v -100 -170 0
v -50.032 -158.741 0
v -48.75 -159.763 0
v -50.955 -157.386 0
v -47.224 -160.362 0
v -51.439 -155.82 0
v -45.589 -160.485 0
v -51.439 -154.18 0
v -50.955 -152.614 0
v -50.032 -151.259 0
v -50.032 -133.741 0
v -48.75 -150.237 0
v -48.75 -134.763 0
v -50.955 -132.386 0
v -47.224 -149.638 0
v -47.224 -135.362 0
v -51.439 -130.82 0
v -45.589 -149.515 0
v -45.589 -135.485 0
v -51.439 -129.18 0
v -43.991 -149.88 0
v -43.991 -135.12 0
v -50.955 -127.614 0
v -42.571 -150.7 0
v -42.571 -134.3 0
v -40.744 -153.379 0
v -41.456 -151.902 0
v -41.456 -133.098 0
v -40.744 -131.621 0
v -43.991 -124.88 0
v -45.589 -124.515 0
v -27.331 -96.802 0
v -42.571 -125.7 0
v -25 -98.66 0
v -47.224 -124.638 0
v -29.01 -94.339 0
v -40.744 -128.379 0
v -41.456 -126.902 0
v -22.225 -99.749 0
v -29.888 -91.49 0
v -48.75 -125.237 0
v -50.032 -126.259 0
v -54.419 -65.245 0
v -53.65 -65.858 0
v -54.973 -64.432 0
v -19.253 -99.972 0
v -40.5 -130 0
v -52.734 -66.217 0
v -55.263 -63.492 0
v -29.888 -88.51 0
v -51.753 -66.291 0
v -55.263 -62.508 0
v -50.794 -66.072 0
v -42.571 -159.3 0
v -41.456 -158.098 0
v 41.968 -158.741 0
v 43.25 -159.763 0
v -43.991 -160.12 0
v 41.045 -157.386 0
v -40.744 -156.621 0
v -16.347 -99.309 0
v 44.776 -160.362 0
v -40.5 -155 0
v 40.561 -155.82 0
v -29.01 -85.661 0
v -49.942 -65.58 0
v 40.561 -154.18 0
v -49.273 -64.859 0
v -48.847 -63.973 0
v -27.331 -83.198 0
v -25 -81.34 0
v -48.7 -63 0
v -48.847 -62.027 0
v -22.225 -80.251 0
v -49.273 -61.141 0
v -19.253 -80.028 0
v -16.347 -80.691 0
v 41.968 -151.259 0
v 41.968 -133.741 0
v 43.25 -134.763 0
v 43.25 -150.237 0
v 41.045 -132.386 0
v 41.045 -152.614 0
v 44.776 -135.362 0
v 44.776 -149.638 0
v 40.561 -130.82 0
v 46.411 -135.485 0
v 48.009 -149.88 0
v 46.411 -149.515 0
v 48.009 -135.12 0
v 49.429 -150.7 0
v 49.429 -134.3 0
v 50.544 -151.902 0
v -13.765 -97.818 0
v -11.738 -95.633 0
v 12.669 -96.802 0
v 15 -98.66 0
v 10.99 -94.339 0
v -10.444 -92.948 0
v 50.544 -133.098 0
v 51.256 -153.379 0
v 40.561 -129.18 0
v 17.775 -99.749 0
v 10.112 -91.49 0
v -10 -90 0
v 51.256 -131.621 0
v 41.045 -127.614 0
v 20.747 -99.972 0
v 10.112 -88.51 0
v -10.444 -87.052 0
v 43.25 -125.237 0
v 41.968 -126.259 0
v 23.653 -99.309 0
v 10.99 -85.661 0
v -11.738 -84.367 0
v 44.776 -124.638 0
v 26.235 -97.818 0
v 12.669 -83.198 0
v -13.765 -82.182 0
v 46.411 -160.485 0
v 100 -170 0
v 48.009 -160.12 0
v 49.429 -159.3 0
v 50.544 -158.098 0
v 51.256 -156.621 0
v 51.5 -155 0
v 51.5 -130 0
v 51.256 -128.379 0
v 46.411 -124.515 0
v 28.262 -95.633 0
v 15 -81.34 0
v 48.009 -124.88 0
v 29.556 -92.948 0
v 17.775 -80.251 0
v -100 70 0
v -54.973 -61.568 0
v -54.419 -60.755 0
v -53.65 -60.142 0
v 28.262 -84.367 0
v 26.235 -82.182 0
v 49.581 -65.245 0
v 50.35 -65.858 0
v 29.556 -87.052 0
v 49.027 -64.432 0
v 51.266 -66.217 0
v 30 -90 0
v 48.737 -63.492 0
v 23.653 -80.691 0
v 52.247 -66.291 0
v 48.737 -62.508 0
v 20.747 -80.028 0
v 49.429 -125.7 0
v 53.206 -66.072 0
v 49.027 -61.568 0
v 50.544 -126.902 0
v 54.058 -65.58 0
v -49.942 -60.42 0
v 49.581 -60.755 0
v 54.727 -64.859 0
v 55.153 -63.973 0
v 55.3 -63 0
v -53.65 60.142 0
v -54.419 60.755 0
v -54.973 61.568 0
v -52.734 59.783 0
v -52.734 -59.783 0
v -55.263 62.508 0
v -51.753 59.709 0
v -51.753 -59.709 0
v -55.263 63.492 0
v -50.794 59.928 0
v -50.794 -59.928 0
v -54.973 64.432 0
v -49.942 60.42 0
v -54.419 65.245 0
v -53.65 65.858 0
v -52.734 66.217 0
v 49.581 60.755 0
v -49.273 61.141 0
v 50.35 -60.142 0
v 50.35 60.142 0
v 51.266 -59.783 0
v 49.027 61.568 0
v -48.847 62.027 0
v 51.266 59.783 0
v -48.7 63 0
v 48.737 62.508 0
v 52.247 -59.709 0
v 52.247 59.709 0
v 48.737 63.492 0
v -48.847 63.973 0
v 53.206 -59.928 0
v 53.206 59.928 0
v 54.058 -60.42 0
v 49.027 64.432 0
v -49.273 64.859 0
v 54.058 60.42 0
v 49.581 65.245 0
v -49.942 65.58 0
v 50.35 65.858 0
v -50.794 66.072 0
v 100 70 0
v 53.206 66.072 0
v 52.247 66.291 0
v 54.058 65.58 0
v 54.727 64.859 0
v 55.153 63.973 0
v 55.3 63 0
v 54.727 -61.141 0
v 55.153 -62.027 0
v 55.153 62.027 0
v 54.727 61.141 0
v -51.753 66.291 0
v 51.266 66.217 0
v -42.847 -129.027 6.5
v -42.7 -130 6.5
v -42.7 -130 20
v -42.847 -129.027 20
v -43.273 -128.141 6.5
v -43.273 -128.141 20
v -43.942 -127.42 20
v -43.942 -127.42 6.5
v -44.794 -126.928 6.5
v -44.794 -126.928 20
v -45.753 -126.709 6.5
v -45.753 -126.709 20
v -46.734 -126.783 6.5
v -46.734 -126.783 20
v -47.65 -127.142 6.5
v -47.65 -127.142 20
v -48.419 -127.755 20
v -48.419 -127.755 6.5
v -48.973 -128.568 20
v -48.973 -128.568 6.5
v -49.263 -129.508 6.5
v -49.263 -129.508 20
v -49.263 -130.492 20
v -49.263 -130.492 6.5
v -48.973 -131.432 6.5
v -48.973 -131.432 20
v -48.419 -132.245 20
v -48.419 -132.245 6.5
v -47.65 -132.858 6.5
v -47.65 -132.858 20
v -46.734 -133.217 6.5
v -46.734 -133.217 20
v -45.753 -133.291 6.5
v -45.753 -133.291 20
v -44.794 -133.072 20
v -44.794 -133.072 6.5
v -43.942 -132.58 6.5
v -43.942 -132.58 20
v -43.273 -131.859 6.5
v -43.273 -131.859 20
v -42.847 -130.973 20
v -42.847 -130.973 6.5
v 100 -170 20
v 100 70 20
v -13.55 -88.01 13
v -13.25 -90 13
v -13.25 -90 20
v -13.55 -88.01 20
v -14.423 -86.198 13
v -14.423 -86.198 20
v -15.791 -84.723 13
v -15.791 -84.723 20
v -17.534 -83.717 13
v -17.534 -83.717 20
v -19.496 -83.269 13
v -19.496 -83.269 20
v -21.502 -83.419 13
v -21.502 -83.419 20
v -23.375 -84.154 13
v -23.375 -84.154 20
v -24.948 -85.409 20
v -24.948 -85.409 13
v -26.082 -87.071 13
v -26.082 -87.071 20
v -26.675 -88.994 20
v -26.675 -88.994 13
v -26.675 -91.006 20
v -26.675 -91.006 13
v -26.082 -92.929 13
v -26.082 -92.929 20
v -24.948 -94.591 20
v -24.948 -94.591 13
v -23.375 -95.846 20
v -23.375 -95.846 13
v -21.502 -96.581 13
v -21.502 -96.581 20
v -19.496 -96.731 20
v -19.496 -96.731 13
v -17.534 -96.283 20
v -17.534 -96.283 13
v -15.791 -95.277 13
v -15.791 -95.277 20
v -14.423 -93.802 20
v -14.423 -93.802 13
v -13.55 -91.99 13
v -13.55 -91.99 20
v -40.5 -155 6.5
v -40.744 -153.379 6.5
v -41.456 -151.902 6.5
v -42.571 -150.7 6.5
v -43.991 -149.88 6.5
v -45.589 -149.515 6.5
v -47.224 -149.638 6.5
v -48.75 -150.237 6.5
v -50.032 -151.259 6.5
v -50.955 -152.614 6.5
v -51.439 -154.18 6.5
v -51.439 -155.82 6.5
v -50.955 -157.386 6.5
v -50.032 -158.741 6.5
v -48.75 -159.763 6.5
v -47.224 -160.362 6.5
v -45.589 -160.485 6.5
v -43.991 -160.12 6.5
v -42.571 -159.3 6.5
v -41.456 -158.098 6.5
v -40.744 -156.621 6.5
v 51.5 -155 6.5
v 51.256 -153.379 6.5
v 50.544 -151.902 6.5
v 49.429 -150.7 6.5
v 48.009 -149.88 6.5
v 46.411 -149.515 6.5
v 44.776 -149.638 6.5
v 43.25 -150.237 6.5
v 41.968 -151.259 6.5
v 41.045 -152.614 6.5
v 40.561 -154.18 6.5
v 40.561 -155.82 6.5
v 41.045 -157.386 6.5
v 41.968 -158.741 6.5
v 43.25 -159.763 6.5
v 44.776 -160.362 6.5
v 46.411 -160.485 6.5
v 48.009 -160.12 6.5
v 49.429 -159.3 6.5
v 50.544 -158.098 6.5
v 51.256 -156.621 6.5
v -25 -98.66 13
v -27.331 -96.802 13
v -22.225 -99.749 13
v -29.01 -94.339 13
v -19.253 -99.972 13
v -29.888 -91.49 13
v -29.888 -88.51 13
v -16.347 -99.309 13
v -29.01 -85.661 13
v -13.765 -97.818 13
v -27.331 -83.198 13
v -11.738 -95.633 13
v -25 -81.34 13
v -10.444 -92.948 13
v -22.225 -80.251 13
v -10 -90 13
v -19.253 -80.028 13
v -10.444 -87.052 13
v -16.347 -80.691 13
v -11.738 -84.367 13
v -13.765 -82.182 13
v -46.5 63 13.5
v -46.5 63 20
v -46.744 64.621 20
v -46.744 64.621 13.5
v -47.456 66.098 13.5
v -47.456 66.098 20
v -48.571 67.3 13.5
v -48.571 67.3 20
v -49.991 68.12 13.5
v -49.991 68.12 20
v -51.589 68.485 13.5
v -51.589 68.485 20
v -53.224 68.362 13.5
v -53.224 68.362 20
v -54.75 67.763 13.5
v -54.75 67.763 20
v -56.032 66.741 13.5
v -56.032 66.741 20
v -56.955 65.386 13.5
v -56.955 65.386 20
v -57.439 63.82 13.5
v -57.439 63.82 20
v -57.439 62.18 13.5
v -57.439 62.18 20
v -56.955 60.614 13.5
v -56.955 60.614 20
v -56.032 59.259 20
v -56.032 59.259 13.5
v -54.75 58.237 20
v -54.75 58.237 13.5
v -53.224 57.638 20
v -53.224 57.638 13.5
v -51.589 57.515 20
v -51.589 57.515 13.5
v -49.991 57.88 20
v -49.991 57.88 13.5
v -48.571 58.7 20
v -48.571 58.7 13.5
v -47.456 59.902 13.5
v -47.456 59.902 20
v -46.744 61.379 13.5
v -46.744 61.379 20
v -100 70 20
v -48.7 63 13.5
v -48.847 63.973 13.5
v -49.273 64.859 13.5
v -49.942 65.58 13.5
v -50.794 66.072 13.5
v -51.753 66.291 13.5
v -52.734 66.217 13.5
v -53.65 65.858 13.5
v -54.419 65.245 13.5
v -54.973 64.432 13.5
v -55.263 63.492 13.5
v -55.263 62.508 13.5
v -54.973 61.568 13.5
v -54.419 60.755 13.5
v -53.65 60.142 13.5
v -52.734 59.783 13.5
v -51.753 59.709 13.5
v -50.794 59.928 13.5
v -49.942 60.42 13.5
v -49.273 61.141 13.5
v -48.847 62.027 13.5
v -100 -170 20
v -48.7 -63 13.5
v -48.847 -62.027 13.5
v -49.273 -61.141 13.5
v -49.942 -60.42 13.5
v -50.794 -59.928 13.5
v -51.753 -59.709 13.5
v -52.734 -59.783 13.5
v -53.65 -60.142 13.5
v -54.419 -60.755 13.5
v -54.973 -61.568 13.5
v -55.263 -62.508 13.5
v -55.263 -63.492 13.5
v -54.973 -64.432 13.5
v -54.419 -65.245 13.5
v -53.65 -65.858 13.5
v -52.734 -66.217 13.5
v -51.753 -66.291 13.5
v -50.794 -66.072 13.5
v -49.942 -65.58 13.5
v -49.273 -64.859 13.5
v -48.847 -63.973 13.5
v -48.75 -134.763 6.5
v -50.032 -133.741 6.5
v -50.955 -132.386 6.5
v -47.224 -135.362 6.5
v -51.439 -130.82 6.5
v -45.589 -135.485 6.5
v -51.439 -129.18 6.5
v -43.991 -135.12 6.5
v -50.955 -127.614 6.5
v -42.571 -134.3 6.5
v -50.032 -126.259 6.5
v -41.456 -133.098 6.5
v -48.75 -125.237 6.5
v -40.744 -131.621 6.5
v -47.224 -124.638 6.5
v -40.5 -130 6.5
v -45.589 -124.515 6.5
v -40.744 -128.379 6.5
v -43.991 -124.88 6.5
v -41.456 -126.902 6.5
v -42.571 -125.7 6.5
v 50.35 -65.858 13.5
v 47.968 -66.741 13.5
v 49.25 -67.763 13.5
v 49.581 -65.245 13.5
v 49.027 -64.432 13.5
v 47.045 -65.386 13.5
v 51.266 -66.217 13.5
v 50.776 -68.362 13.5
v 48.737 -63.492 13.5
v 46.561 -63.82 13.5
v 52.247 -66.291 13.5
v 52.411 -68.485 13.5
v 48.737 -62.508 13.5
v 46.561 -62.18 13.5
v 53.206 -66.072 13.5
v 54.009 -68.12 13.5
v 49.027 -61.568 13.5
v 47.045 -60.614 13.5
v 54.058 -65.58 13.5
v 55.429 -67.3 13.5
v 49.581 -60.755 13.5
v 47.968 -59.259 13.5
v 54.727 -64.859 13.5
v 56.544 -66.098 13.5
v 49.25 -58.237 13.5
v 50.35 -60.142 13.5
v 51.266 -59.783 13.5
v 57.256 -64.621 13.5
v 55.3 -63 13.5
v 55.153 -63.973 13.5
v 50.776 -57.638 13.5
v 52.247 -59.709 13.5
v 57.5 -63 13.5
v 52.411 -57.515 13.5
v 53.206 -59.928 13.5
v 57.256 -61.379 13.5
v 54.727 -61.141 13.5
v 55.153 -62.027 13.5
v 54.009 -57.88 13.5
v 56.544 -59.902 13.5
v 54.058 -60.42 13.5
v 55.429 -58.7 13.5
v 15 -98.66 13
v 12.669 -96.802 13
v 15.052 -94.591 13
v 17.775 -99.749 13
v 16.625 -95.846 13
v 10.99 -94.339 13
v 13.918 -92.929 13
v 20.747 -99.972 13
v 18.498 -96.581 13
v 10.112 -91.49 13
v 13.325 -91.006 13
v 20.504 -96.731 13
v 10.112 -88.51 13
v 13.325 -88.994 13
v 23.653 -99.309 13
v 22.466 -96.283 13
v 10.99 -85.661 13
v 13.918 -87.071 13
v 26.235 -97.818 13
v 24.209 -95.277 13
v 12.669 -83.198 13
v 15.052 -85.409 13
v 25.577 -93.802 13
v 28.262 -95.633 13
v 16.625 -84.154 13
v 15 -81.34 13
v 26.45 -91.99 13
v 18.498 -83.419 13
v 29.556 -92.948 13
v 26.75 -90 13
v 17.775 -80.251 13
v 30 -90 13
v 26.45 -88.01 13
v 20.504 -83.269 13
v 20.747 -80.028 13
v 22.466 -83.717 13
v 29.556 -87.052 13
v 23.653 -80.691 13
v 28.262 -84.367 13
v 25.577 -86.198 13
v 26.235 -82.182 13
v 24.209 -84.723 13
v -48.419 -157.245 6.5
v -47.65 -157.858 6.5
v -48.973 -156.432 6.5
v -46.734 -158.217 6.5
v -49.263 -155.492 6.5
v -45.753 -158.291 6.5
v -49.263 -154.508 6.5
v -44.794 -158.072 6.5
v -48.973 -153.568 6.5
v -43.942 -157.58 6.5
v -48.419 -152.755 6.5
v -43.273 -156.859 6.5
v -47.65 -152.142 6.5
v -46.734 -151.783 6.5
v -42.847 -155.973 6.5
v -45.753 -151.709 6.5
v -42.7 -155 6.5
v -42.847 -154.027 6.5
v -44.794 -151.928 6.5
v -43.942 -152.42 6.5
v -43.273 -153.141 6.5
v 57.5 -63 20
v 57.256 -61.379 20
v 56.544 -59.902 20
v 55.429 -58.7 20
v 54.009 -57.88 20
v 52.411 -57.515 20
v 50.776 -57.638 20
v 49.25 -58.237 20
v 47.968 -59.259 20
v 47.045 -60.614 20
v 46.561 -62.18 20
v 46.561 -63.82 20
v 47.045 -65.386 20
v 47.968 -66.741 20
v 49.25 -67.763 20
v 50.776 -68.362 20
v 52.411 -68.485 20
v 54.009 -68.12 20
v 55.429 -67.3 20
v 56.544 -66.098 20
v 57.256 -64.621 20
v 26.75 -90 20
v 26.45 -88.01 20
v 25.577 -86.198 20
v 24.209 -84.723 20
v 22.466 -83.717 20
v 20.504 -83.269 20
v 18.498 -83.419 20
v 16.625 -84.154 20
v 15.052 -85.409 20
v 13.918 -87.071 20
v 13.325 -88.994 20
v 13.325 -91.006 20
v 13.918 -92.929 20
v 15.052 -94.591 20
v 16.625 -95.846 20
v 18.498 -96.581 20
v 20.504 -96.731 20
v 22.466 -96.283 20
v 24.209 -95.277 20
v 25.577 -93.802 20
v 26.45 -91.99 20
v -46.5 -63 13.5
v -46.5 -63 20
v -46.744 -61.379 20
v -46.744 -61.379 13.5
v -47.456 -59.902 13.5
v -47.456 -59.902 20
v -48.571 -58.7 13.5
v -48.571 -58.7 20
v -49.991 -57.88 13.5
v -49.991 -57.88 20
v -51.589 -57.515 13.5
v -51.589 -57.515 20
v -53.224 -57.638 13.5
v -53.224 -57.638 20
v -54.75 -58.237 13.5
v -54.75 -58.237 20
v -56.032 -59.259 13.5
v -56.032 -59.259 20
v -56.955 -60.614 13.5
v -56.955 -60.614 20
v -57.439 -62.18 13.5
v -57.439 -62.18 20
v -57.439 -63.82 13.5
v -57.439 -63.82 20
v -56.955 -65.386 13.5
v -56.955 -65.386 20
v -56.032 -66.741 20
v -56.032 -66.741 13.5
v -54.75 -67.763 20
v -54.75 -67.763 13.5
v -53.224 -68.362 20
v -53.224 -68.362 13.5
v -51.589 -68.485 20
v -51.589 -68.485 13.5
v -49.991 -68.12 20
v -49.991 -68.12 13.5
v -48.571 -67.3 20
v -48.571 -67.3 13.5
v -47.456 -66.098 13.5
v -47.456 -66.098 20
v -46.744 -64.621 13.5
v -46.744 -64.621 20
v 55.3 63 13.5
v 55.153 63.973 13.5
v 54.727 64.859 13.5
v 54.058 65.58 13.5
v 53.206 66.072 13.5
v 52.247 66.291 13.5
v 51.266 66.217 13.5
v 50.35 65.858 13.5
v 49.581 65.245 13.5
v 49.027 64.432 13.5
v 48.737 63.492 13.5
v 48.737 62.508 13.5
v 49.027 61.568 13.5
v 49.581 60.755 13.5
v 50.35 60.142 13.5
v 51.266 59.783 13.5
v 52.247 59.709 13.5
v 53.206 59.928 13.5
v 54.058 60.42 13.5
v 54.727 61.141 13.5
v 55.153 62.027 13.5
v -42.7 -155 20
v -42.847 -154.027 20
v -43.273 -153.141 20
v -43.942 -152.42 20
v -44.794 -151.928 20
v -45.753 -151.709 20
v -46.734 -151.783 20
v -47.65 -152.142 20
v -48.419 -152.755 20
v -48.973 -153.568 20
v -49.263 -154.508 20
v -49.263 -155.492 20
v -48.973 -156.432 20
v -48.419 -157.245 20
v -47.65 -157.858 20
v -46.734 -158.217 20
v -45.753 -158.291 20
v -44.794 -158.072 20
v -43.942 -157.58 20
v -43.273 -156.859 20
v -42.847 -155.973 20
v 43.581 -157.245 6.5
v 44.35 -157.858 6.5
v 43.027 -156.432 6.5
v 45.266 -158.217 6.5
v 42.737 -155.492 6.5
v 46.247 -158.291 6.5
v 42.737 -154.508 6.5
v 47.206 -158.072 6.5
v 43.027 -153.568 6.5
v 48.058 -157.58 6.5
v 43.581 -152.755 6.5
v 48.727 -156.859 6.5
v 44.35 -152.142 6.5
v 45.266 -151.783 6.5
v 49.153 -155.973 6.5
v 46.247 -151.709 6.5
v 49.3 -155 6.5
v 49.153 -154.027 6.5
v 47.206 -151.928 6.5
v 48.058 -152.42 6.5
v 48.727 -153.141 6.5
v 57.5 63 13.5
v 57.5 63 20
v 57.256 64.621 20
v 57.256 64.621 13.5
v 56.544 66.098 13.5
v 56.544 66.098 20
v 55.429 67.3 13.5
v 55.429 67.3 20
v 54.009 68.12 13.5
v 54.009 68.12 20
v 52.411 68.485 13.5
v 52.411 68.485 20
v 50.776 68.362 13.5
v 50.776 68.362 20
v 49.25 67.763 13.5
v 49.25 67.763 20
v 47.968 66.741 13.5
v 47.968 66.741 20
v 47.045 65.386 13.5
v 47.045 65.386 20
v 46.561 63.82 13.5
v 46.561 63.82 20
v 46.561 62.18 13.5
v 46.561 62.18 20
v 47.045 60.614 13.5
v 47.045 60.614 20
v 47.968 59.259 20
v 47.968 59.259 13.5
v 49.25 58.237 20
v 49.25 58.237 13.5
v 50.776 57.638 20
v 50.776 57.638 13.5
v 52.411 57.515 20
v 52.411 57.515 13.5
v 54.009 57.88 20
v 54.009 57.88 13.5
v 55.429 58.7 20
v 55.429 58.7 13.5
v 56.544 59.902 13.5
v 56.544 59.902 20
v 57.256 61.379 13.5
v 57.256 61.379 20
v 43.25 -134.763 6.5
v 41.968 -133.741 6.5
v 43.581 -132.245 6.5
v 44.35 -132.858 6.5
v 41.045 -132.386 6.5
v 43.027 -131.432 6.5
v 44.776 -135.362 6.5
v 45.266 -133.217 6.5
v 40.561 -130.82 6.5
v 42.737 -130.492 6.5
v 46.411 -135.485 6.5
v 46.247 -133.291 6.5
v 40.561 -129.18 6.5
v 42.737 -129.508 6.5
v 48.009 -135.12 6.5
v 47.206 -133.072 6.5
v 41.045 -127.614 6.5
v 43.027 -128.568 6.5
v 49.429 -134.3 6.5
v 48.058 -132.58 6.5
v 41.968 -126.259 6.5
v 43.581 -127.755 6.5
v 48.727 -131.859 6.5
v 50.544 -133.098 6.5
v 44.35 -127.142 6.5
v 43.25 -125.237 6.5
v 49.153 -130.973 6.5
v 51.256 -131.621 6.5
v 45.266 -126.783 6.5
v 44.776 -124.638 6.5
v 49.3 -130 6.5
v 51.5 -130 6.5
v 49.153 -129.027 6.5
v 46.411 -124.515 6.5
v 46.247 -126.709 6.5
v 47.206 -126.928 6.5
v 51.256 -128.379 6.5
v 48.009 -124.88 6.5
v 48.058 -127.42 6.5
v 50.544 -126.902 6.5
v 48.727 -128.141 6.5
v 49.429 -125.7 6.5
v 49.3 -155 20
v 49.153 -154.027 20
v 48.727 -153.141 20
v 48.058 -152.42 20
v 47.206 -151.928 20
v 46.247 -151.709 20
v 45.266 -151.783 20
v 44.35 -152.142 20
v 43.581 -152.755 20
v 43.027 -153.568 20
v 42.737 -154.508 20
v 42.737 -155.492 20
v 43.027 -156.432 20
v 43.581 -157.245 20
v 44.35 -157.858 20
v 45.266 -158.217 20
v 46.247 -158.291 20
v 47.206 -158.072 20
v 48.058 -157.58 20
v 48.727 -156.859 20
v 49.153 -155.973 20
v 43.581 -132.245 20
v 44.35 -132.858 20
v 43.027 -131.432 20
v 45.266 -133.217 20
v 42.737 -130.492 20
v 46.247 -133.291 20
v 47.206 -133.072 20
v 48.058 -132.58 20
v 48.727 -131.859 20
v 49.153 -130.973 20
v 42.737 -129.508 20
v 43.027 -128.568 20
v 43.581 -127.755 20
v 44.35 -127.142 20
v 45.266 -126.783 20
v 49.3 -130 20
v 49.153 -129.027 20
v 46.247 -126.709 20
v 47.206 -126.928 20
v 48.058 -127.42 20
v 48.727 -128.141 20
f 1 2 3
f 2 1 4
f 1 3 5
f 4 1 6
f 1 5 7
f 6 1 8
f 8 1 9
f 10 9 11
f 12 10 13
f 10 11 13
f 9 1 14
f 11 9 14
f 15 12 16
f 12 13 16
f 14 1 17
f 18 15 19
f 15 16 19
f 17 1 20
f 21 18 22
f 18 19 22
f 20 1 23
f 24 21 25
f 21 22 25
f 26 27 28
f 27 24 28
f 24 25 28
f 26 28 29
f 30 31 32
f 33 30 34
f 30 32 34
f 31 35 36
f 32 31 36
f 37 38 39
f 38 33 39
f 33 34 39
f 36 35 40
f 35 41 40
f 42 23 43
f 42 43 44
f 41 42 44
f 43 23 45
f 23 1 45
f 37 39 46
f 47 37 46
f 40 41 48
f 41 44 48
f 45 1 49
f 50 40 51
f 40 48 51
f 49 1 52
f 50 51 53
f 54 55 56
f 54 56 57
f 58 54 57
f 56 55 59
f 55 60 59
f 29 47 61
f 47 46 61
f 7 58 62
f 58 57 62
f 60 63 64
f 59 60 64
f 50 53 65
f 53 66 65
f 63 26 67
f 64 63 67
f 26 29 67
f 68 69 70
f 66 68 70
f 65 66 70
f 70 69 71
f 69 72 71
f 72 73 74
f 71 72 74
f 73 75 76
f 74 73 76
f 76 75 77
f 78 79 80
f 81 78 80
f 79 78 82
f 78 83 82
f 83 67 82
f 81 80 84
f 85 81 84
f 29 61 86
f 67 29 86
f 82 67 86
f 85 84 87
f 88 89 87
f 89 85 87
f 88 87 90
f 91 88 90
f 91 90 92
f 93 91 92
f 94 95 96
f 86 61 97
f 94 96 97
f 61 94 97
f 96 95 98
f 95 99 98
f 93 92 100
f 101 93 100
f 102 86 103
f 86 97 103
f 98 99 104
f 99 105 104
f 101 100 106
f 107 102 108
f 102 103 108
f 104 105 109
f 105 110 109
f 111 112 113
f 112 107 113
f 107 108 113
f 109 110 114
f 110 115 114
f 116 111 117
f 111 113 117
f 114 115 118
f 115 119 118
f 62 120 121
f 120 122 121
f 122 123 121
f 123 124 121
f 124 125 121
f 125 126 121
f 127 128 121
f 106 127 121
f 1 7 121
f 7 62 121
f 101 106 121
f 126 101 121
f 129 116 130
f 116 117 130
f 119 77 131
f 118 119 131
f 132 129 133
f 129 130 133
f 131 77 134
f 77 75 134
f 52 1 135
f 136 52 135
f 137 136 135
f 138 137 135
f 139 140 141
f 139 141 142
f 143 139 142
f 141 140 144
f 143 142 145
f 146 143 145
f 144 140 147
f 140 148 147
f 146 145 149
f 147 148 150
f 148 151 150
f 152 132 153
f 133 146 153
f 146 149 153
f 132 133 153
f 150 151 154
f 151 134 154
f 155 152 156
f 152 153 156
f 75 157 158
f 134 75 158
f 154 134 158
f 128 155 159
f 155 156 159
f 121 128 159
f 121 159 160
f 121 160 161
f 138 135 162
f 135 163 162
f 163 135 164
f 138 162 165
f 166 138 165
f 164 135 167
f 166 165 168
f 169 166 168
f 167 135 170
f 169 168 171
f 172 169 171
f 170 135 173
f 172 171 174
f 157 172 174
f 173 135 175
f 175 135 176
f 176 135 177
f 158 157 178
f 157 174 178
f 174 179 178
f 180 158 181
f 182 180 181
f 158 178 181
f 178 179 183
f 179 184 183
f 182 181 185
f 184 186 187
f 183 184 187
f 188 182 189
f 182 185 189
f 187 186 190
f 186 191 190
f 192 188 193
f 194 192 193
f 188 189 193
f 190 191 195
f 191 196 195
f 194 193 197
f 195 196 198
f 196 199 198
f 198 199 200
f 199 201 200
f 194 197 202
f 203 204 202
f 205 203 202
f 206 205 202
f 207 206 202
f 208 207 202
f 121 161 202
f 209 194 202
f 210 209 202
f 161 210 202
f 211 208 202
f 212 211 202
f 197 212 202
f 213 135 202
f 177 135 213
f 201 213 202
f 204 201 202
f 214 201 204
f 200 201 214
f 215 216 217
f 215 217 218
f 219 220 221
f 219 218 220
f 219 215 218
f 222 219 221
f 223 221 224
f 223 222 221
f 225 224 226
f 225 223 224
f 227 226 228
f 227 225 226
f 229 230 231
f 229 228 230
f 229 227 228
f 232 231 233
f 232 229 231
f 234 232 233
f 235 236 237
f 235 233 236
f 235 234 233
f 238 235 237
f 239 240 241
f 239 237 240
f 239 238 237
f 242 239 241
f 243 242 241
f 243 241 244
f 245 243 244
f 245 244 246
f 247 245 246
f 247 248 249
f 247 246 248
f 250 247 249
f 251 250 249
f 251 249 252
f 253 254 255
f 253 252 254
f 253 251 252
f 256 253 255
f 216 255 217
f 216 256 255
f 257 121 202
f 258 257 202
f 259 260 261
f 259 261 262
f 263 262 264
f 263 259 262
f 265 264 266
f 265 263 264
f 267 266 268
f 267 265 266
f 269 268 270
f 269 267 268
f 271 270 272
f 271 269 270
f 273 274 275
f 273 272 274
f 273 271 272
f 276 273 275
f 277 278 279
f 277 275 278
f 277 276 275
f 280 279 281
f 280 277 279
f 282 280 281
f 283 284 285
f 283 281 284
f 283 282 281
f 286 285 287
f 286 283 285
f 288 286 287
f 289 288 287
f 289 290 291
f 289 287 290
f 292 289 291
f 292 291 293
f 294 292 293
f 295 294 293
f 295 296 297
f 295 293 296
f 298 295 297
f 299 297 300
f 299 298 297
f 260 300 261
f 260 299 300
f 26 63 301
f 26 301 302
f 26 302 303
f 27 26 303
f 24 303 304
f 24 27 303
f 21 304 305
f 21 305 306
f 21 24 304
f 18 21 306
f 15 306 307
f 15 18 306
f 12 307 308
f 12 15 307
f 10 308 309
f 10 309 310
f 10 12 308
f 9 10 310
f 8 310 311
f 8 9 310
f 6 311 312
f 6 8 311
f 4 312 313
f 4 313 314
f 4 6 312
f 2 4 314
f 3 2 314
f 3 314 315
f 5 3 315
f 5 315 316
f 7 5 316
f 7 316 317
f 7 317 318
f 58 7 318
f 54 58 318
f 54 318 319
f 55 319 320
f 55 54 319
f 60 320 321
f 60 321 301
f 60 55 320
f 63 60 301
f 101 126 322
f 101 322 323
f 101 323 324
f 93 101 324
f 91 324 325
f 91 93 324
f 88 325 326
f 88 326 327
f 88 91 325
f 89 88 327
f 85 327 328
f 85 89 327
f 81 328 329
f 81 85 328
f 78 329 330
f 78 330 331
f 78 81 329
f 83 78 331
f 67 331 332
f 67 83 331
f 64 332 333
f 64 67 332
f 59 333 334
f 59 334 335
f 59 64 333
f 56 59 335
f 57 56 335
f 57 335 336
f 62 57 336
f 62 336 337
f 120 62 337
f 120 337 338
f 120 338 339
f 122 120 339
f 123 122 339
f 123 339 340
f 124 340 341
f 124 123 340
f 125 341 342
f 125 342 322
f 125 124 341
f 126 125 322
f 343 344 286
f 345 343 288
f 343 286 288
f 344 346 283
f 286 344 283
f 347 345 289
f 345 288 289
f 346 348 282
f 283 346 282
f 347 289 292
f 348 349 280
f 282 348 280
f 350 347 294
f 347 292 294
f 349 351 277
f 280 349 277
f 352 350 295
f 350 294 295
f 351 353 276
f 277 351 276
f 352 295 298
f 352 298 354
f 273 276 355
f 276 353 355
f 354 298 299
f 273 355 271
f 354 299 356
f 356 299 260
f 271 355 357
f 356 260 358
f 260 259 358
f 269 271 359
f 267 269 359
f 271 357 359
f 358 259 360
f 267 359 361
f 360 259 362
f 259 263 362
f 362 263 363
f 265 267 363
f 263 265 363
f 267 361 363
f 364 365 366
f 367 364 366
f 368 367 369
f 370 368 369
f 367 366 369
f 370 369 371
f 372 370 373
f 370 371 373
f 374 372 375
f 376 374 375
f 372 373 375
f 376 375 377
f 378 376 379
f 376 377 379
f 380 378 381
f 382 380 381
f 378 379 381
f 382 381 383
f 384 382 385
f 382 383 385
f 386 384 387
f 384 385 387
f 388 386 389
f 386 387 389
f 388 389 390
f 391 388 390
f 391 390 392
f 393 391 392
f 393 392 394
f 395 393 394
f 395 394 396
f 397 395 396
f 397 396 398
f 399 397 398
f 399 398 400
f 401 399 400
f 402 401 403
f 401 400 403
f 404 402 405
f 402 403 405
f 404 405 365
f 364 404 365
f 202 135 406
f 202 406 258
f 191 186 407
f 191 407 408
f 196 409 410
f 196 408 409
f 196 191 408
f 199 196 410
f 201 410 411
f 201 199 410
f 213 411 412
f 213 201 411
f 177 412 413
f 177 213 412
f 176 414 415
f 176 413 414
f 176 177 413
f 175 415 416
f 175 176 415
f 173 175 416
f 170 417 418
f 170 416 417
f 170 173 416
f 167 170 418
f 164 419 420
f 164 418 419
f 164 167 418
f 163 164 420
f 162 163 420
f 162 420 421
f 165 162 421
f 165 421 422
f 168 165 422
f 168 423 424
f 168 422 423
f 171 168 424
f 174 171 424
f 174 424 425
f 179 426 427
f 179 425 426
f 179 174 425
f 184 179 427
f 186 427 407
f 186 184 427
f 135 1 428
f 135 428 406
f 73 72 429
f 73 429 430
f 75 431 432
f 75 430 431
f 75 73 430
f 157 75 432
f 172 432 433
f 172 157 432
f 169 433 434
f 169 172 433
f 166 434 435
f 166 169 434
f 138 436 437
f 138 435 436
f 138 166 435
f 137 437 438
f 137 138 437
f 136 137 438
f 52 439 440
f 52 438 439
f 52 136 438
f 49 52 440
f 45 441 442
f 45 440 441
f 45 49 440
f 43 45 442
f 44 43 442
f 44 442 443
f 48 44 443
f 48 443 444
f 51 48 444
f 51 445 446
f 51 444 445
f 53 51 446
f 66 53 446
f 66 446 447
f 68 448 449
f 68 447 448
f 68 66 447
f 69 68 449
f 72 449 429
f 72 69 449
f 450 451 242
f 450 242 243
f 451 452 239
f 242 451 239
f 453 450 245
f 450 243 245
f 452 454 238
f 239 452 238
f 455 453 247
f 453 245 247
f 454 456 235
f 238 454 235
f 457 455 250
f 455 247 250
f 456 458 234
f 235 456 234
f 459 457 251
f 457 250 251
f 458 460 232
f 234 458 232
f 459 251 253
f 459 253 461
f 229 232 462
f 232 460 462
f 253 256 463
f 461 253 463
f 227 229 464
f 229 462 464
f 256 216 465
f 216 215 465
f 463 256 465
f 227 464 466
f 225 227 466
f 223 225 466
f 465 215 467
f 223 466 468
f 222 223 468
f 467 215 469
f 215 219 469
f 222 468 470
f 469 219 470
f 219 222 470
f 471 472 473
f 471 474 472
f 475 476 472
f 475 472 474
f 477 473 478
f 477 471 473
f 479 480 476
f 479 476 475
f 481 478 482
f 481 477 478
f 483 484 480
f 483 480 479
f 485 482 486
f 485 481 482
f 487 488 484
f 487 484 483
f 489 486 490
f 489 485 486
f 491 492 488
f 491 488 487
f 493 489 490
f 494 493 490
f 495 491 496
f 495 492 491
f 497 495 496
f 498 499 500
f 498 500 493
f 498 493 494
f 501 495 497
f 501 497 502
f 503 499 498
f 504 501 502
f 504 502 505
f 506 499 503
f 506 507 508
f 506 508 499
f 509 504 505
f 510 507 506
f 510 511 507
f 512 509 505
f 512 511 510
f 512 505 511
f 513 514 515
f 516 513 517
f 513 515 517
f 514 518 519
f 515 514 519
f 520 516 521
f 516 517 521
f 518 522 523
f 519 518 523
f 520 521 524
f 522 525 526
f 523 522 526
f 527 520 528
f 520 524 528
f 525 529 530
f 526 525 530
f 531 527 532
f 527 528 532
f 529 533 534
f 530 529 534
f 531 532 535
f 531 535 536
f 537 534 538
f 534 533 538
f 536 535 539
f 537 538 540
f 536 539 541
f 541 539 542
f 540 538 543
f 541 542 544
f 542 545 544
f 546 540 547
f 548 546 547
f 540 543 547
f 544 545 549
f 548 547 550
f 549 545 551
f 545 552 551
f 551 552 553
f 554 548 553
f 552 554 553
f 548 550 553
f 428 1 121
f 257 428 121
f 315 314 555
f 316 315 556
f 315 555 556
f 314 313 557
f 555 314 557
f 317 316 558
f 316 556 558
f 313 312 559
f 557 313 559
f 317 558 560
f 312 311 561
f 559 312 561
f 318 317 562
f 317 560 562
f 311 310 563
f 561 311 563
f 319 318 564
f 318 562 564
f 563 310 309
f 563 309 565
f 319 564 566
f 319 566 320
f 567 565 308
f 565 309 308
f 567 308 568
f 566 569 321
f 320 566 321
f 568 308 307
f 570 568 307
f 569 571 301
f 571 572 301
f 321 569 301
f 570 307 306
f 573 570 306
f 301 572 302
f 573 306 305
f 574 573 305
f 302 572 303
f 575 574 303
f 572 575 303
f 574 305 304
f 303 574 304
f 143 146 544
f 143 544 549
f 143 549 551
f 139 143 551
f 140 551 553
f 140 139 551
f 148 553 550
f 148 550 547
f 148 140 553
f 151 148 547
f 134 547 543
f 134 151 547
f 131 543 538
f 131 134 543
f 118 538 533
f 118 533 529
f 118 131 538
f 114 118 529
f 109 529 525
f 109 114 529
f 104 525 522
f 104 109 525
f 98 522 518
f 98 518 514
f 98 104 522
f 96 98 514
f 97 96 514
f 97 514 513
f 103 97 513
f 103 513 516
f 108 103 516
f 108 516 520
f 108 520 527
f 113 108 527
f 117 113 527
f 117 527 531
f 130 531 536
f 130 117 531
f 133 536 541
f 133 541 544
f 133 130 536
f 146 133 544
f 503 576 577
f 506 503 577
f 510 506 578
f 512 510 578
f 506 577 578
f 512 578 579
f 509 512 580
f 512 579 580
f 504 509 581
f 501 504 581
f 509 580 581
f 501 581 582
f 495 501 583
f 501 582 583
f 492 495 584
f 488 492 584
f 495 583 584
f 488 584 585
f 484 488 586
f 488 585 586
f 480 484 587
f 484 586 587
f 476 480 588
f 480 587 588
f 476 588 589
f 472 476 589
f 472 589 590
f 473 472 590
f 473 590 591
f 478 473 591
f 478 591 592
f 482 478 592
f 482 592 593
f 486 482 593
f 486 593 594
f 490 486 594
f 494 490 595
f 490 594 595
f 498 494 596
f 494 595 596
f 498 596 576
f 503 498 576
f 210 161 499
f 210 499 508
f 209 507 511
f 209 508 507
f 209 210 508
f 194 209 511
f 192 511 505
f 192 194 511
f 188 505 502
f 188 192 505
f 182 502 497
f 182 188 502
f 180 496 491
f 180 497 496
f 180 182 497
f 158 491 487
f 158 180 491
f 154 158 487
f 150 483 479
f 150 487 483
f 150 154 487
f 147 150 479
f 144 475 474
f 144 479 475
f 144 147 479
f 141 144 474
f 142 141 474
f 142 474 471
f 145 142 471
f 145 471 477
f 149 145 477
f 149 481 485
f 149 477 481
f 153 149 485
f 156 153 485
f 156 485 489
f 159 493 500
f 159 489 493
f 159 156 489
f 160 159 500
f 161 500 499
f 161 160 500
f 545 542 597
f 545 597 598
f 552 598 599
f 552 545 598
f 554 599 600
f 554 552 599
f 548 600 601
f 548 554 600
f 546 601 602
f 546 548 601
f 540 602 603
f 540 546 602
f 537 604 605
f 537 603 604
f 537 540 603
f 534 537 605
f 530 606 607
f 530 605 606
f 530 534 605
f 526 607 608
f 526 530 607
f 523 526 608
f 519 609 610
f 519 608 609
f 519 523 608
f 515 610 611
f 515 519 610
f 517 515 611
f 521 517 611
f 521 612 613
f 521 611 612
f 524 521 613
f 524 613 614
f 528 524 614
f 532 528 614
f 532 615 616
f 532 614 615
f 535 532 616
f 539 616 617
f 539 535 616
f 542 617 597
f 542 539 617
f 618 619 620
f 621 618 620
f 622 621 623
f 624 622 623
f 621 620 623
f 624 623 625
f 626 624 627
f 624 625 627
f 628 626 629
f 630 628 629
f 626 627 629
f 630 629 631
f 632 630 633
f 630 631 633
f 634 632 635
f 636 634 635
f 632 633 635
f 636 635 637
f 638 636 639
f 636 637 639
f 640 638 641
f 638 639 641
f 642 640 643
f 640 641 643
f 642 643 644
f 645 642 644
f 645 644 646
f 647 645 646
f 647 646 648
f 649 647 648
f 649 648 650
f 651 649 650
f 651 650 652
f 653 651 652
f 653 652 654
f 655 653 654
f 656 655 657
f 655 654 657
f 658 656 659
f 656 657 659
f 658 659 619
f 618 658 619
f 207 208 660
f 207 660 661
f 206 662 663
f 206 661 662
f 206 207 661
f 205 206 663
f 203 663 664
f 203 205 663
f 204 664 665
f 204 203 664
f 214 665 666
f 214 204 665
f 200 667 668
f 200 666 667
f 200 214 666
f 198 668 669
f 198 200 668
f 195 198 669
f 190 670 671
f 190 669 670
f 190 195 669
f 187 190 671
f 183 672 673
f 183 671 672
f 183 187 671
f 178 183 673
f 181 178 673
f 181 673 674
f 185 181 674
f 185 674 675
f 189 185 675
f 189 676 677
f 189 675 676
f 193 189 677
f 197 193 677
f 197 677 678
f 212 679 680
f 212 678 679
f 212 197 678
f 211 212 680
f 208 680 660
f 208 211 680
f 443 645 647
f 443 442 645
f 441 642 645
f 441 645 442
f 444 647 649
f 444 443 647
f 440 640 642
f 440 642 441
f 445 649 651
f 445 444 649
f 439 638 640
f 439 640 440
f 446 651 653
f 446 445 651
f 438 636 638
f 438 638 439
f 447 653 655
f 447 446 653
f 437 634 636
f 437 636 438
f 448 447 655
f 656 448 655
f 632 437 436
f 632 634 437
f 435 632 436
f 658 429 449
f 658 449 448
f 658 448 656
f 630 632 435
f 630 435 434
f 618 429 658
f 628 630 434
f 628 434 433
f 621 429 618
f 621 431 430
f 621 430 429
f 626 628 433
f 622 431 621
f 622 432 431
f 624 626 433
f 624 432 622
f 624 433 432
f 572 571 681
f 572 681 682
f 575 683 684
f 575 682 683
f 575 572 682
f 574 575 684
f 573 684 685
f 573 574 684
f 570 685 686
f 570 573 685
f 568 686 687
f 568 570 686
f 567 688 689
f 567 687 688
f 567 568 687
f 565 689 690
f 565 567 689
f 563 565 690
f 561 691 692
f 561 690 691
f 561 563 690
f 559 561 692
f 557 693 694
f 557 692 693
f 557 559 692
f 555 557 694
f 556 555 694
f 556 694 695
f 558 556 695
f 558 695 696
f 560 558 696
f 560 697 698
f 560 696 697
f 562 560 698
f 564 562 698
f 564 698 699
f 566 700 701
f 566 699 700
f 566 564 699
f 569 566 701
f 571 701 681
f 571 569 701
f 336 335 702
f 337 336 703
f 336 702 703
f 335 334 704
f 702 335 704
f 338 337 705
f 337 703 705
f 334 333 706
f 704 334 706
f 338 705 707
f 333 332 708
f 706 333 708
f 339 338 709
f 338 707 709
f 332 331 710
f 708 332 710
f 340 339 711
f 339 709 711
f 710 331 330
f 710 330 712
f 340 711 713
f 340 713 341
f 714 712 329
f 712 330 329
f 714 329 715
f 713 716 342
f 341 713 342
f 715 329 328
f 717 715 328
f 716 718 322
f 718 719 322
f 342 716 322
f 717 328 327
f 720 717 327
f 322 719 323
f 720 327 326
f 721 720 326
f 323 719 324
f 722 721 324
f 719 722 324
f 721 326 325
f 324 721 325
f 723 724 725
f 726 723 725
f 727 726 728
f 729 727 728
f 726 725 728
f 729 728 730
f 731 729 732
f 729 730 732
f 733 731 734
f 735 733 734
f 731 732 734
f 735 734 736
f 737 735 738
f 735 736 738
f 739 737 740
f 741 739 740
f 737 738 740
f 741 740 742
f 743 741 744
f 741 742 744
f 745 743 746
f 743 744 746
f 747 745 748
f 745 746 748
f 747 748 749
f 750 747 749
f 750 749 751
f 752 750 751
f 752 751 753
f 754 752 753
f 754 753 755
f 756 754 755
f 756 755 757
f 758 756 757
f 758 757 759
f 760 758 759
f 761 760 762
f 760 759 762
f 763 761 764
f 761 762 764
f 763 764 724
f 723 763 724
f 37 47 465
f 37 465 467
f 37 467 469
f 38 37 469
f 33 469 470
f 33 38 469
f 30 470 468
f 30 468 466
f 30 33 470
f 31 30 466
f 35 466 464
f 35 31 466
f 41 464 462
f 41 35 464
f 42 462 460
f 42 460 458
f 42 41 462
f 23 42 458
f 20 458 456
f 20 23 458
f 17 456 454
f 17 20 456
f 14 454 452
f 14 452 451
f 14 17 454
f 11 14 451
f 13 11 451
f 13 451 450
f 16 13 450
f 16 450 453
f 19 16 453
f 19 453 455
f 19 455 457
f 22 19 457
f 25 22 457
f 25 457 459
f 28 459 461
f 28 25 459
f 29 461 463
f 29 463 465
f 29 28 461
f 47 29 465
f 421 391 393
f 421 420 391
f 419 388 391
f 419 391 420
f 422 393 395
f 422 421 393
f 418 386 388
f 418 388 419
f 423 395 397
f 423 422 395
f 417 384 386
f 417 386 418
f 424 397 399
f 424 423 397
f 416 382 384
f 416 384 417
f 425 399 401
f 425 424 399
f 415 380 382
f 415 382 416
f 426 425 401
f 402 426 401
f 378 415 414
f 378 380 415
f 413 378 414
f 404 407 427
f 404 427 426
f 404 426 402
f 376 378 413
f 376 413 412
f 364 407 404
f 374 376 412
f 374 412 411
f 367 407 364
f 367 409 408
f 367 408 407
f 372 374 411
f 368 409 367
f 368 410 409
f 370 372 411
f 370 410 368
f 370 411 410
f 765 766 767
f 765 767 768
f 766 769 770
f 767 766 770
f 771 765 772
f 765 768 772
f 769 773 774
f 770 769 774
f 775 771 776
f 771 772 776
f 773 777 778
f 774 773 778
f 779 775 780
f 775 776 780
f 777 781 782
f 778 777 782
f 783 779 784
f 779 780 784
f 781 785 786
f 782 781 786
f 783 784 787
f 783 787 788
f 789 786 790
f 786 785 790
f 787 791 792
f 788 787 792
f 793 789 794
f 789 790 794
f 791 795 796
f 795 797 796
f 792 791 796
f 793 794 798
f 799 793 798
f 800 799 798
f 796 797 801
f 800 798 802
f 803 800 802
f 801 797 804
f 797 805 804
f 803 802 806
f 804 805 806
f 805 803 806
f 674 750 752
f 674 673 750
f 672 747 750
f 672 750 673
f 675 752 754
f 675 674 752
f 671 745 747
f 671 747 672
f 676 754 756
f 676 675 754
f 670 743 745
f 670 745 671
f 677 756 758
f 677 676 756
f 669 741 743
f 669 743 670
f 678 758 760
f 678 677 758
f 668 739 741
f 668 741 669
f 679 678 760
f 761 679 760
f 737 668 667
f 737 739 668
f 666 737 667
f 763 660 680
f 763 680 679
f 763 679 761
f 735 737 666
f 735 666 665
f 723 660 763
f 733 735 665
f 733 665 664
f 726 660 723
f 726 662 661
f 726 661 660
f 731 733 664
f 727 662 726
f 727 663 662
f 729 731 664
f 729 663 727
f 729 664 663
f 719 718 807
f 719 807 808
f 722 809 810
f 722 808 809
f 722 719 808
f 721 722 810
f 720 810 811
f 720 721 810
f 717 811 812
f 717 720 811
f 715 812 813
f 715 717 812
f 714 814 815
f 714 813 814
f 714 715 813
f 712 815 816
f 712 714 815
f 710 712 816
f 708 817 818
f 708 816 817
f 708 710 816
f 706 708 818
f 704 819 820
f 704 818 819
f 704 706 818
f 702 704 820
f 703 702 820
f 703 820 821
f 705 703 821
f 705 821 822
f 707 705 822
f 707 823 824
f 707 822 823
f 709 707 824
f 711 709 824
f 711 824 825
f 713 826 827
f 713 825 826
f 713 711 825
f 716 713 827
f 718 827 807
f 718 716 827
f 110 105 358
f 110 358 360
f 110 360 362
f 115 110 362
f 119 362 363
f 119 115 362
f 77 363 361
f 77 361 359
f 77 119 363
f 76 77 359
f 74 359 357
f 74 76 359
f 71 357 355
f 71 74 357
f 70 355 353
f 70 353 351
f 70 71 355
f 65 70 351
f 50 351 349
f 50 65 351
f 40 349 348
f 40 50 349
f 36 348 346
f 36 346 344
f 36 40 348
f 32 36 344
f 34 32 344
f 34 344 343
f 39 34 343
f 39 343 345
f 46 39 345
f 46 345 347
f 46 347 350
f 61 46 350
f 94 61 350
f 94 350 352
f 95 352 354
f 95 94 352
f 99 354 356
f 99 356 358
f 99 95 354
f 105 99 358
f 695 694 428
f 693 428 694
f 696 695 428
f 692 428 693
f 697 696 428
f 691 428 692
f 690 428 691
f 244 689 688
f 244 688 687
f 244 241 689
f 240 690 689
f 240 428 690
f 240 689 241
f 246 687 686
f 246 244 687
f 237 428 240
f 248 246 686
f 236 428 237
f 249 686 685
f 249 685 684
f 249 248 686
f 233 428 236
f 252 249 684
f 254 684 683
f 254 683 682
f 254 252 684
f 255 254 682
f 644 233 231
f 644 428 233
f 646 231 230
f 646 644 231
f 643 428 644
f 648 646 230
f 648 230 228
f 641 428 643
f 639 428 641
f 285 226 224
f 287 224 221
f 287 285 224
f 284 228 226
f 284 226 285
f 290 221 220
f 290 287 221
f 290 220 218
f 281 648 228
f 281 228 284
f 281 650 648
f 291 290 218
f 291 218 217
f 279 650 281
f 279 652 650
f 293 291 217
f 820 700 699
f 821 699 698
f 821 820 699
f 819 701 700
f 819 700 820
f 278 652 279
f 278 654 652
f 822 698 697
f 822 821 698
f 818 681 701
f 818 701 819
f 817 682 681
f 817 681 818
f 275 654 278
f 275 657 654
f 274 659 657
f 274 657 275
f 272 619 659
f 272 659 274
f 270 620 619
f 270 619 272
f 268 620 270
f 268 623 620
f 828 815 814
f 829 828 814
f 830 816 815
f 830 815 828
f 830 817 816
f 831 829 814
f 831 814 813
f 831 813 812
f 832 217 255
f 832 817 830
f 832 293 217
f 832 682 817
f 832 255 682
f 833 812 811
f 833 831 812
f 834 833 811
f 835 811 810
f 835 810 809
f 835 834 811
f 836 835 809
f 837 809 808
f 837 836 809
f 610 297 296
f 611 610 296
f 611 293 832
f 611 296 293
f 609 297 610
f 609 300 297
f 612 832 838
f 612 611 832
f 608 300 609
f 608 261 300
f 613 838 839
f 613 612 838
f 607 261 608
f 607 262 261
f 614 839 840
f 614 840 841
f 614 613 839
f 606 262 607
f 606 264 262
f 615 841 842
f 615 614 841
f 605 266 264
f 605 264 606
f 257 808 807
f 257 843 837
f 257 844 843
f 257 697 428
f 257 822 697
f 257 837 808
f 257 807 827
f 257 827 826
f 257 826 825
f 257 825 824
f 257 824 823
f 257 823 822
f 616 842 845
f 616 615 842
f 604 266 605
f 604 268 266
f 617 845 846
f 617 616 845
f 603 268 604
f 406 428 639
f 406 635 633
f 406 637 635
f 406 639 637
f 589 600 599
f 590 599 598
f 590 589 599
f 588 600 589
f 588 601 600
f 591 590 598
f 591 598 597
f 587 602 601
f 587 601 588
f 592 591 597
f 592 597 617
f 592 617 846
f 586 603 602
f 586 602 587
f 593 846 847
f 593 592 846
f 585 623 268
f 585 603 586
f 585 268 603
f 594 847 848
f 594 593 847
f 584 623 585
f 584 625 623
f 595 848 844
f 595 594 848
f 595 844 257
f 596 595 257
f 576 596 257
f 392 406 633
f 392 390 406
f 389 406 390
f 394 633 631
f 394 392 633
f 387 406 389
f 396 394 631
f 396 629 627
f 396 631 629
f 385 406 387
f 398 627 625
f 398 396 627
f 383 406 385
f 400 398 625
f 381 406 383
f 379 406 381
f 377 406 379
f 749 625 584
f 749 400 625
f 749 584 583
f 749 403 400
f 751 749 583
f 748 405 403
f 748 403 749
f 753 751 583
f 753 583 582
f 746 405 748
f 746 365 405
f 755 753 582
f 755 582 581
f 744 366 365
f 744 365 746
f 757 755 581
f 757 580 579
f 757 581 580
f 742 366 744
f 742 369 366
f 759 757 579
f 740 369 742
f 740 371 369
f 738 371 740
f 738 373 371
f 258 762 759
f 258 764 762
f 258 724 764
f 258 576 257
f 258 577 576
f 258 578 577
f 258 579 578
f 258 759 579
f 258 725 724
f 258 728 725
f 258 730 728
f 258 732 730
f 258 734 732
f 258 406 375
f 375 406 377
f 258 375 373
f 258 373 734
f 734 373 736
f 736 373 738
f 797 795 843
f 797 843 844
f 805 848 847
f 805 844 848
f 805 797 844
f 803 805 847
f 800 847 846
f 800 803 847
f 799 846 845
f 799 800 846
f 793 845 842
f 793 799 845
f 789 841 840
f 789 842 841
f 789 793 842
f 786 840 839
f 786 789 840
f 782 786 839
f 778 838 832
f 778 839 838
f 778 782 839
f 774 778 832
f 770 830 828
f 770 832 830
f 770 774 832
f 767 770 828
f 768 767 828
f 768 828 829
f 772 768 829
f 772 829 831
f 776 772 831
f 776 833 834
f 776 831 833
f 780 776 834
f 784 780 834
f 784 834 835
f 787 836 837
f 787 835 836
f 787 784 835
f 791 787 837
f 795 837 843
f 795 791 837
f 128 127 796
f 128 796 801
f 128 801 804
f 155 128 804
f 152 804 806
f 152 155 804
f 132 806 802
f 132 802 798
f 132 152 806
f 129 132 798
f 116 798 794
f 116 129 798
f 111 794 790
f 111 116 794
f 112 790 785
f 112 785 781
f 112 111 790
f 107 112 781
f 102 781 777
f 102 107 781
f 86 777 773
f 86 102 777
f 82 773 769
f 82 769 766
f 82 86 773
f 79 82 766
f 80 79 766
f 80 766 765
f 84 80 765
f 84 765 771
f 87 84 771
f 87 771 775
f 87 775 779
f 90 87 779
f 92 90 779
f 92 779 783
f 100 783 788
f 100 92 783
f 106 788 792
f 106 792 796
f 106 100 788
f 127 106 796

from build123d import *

# Parameters (mm, degrees)
SKETCH1_W                = 240
SKETCH1_H                = 240
BOSS_EXTRUDE1_DEPTH      = 20
CUT_EXTRUDE1_DEPTH       = 210.045449604
CUT_EXTRUDE1_DEPTH_BACK  = 210.045449604
SKETCH2_R                = 3.3
SKETCH3_R                = 5.5
CUT_EXTRUDE3_DEPTH       = 6.5
CUT_EXTRUDE4_DEPTH       = 210.045449604
CUT_EXTRUDE4_DEPTH_BACK  = 210.045449604
SKETCH4_R                = 6.75
SKETCH5_R                = 10
CUT_EXTRUDE6_DEPTH       = 13
CUT_EXTRUDE7_DEPTH       = 210.045449604
CUT_EXTRUDE7_DEPTH_BACK  = 210.045449604
SKETCH6_R                = 3.3
SKETCH7_R                = 5.5
CUT_EXTRUDE9_DEPTH       = 6.5
CUT_EXTRUDE10_DEPTH      = 210.045449604
CUT_EXTRUDE10_DEPTH_BACK = 210.045449604
SKETCH8_W                = 30
SKETCH8_H                = 260


with BuildPart() as part:
    # Sketch1 → Boss-Extrude1 (new body)
    with BuildSketch(Plane.XY):
        with Locations((0, -50)):
            Rectangle(SKETCH1_W, SKETCH1_H)
    extrude(amount=BOSS_EXTRUDE1_DEPTH)

    # Sketch2 → Cut-Extrude1 (cut, two sides: drawn at the far end of the back side and taken through both)
    with BuildSketch(Plane.XY.offset(-CUT_EXTRUDE1_DEPTH_BACK)):
        with Locations((-52, -63)):
            Circle(SKETCH2_R)
        with Locations((-52, 63)):
            Circle(SKETCH2_R)
        with Locations((52, -63)):
            Circle(SKETCH2_R)
        with Locations((52, 63)):
            Circle(SKETCH2_R)
    extrude(amount=CUT_EXTRUDE1_DEPTH + CUT_EXTRUDE1_DEPTH_BACK, mode=Mode.SUBTRACT)

    # Sketch3 → Cut-Extrude3 (cut)
    with BuildSketch(Plane.XY.offset(20)):
        with Locations((-52, -63)):
            Circle(SKETCH3_R)
        with Locations((-52, 63)):
            Circle(SKETCH3_R)
        with Locations((52, -63)):
            Circle(SKETCH3_R)
        with Locations((52, 63)):
            Circle(SKETCH3_R)
    extrude(amount=-CUT_EXTRUDE3_DEPTH, mode=Mode.SUBTRACT)

    # Sketch4 → Cut-Extrude4 (cut, two sides: drawn at the far end of the back side and taken through both)
    with BuildSketch(Plane.XY.offset(-CUT_EXTRUDE4_DEPTH_BACK)):
        with Locations((-20, -90)):
            Circle(SKETCH4_R)
        with Locations((20, -90)):
            Circle(SKETCH4_R)
    extrude(amount=CUT_EXTRUDE4_DEPTH + CUT_EXTRUDE4_DEPTH_BACK, mode=Mode.SUBTRACT)

    # Sketch5 → Cut-Extrude6 (cut)
    with BuildSketch(Plane.XY):
        with Locations((-20, -90)):
            Circle(SKETCH5_R)
        with Locations((20, -90)):
            Circle(SKETCH5_R)
    extrude(amount=CUT_EXTRUDE6_DEPTH, mode=Mode.SUBTRACT)

    # Sketch6 → Cut-Extrude7 (cut, two sides: drawn at the far end of the back side and taken through both)
    with BuildSketch(Plane.XY.offset(-CUT_EXTRUDE7_DEPTH_BACK)):
        with Locations((-46, -130)):
            Circle(SKETCH6_R)
        with Locations((-46, -155)):
            Circle(SKETCH6_R)
        with Locations((46, -130)):
            Circle(SKETCH6_R)
        with Locations((46, -155)):
            Circle(SKETCH6_R)
    extrude(amount=CUT_EXTRUDE7_DEPTH + CUT_EXTRUDE7_DEPTH_BACK, mode=Mode.SUBTRACT)

    # Sketch7 → Cut-Extrude9 (cut)
    with BuildSketch(Plane.XY):
        with Locations((-46, -130)):
            Circle(SKETCH7_R)
        with Locations((-46, -155)):
            Circle(SKETCH7_R)
        with Locations((46, -130)):
            Circle(SKETCH7_R)
        with Locations((46, -155)):
            Circle(SKETCH7_R)
    extrude(amount=CUT_EXTRUDE9_DEPTH, mode=Mode.SUBTRACT)

    # Sketch8 → Cut-Extrude10 (cut, two sides: drawn at the far end of the back side and taken through both)
    with BuildSketch(Plane.XY.offset(-CUT_EXTRUDE10_DEPTH_BACK)):
        with Locations((-115, -50)):
            Rectangle(SKETCH8_W, SKETCH8_H)
        with Locations((115, -50)):
            Rectangle(SKETCH8_W, SKETCH8_H)
    extrude(amount=CUT_EXTRUDE10_DEPTH + CUT_EXTRUDE10_DEPTH_BACK, mode=Mode.SUBTRACT)


solid = part.part
